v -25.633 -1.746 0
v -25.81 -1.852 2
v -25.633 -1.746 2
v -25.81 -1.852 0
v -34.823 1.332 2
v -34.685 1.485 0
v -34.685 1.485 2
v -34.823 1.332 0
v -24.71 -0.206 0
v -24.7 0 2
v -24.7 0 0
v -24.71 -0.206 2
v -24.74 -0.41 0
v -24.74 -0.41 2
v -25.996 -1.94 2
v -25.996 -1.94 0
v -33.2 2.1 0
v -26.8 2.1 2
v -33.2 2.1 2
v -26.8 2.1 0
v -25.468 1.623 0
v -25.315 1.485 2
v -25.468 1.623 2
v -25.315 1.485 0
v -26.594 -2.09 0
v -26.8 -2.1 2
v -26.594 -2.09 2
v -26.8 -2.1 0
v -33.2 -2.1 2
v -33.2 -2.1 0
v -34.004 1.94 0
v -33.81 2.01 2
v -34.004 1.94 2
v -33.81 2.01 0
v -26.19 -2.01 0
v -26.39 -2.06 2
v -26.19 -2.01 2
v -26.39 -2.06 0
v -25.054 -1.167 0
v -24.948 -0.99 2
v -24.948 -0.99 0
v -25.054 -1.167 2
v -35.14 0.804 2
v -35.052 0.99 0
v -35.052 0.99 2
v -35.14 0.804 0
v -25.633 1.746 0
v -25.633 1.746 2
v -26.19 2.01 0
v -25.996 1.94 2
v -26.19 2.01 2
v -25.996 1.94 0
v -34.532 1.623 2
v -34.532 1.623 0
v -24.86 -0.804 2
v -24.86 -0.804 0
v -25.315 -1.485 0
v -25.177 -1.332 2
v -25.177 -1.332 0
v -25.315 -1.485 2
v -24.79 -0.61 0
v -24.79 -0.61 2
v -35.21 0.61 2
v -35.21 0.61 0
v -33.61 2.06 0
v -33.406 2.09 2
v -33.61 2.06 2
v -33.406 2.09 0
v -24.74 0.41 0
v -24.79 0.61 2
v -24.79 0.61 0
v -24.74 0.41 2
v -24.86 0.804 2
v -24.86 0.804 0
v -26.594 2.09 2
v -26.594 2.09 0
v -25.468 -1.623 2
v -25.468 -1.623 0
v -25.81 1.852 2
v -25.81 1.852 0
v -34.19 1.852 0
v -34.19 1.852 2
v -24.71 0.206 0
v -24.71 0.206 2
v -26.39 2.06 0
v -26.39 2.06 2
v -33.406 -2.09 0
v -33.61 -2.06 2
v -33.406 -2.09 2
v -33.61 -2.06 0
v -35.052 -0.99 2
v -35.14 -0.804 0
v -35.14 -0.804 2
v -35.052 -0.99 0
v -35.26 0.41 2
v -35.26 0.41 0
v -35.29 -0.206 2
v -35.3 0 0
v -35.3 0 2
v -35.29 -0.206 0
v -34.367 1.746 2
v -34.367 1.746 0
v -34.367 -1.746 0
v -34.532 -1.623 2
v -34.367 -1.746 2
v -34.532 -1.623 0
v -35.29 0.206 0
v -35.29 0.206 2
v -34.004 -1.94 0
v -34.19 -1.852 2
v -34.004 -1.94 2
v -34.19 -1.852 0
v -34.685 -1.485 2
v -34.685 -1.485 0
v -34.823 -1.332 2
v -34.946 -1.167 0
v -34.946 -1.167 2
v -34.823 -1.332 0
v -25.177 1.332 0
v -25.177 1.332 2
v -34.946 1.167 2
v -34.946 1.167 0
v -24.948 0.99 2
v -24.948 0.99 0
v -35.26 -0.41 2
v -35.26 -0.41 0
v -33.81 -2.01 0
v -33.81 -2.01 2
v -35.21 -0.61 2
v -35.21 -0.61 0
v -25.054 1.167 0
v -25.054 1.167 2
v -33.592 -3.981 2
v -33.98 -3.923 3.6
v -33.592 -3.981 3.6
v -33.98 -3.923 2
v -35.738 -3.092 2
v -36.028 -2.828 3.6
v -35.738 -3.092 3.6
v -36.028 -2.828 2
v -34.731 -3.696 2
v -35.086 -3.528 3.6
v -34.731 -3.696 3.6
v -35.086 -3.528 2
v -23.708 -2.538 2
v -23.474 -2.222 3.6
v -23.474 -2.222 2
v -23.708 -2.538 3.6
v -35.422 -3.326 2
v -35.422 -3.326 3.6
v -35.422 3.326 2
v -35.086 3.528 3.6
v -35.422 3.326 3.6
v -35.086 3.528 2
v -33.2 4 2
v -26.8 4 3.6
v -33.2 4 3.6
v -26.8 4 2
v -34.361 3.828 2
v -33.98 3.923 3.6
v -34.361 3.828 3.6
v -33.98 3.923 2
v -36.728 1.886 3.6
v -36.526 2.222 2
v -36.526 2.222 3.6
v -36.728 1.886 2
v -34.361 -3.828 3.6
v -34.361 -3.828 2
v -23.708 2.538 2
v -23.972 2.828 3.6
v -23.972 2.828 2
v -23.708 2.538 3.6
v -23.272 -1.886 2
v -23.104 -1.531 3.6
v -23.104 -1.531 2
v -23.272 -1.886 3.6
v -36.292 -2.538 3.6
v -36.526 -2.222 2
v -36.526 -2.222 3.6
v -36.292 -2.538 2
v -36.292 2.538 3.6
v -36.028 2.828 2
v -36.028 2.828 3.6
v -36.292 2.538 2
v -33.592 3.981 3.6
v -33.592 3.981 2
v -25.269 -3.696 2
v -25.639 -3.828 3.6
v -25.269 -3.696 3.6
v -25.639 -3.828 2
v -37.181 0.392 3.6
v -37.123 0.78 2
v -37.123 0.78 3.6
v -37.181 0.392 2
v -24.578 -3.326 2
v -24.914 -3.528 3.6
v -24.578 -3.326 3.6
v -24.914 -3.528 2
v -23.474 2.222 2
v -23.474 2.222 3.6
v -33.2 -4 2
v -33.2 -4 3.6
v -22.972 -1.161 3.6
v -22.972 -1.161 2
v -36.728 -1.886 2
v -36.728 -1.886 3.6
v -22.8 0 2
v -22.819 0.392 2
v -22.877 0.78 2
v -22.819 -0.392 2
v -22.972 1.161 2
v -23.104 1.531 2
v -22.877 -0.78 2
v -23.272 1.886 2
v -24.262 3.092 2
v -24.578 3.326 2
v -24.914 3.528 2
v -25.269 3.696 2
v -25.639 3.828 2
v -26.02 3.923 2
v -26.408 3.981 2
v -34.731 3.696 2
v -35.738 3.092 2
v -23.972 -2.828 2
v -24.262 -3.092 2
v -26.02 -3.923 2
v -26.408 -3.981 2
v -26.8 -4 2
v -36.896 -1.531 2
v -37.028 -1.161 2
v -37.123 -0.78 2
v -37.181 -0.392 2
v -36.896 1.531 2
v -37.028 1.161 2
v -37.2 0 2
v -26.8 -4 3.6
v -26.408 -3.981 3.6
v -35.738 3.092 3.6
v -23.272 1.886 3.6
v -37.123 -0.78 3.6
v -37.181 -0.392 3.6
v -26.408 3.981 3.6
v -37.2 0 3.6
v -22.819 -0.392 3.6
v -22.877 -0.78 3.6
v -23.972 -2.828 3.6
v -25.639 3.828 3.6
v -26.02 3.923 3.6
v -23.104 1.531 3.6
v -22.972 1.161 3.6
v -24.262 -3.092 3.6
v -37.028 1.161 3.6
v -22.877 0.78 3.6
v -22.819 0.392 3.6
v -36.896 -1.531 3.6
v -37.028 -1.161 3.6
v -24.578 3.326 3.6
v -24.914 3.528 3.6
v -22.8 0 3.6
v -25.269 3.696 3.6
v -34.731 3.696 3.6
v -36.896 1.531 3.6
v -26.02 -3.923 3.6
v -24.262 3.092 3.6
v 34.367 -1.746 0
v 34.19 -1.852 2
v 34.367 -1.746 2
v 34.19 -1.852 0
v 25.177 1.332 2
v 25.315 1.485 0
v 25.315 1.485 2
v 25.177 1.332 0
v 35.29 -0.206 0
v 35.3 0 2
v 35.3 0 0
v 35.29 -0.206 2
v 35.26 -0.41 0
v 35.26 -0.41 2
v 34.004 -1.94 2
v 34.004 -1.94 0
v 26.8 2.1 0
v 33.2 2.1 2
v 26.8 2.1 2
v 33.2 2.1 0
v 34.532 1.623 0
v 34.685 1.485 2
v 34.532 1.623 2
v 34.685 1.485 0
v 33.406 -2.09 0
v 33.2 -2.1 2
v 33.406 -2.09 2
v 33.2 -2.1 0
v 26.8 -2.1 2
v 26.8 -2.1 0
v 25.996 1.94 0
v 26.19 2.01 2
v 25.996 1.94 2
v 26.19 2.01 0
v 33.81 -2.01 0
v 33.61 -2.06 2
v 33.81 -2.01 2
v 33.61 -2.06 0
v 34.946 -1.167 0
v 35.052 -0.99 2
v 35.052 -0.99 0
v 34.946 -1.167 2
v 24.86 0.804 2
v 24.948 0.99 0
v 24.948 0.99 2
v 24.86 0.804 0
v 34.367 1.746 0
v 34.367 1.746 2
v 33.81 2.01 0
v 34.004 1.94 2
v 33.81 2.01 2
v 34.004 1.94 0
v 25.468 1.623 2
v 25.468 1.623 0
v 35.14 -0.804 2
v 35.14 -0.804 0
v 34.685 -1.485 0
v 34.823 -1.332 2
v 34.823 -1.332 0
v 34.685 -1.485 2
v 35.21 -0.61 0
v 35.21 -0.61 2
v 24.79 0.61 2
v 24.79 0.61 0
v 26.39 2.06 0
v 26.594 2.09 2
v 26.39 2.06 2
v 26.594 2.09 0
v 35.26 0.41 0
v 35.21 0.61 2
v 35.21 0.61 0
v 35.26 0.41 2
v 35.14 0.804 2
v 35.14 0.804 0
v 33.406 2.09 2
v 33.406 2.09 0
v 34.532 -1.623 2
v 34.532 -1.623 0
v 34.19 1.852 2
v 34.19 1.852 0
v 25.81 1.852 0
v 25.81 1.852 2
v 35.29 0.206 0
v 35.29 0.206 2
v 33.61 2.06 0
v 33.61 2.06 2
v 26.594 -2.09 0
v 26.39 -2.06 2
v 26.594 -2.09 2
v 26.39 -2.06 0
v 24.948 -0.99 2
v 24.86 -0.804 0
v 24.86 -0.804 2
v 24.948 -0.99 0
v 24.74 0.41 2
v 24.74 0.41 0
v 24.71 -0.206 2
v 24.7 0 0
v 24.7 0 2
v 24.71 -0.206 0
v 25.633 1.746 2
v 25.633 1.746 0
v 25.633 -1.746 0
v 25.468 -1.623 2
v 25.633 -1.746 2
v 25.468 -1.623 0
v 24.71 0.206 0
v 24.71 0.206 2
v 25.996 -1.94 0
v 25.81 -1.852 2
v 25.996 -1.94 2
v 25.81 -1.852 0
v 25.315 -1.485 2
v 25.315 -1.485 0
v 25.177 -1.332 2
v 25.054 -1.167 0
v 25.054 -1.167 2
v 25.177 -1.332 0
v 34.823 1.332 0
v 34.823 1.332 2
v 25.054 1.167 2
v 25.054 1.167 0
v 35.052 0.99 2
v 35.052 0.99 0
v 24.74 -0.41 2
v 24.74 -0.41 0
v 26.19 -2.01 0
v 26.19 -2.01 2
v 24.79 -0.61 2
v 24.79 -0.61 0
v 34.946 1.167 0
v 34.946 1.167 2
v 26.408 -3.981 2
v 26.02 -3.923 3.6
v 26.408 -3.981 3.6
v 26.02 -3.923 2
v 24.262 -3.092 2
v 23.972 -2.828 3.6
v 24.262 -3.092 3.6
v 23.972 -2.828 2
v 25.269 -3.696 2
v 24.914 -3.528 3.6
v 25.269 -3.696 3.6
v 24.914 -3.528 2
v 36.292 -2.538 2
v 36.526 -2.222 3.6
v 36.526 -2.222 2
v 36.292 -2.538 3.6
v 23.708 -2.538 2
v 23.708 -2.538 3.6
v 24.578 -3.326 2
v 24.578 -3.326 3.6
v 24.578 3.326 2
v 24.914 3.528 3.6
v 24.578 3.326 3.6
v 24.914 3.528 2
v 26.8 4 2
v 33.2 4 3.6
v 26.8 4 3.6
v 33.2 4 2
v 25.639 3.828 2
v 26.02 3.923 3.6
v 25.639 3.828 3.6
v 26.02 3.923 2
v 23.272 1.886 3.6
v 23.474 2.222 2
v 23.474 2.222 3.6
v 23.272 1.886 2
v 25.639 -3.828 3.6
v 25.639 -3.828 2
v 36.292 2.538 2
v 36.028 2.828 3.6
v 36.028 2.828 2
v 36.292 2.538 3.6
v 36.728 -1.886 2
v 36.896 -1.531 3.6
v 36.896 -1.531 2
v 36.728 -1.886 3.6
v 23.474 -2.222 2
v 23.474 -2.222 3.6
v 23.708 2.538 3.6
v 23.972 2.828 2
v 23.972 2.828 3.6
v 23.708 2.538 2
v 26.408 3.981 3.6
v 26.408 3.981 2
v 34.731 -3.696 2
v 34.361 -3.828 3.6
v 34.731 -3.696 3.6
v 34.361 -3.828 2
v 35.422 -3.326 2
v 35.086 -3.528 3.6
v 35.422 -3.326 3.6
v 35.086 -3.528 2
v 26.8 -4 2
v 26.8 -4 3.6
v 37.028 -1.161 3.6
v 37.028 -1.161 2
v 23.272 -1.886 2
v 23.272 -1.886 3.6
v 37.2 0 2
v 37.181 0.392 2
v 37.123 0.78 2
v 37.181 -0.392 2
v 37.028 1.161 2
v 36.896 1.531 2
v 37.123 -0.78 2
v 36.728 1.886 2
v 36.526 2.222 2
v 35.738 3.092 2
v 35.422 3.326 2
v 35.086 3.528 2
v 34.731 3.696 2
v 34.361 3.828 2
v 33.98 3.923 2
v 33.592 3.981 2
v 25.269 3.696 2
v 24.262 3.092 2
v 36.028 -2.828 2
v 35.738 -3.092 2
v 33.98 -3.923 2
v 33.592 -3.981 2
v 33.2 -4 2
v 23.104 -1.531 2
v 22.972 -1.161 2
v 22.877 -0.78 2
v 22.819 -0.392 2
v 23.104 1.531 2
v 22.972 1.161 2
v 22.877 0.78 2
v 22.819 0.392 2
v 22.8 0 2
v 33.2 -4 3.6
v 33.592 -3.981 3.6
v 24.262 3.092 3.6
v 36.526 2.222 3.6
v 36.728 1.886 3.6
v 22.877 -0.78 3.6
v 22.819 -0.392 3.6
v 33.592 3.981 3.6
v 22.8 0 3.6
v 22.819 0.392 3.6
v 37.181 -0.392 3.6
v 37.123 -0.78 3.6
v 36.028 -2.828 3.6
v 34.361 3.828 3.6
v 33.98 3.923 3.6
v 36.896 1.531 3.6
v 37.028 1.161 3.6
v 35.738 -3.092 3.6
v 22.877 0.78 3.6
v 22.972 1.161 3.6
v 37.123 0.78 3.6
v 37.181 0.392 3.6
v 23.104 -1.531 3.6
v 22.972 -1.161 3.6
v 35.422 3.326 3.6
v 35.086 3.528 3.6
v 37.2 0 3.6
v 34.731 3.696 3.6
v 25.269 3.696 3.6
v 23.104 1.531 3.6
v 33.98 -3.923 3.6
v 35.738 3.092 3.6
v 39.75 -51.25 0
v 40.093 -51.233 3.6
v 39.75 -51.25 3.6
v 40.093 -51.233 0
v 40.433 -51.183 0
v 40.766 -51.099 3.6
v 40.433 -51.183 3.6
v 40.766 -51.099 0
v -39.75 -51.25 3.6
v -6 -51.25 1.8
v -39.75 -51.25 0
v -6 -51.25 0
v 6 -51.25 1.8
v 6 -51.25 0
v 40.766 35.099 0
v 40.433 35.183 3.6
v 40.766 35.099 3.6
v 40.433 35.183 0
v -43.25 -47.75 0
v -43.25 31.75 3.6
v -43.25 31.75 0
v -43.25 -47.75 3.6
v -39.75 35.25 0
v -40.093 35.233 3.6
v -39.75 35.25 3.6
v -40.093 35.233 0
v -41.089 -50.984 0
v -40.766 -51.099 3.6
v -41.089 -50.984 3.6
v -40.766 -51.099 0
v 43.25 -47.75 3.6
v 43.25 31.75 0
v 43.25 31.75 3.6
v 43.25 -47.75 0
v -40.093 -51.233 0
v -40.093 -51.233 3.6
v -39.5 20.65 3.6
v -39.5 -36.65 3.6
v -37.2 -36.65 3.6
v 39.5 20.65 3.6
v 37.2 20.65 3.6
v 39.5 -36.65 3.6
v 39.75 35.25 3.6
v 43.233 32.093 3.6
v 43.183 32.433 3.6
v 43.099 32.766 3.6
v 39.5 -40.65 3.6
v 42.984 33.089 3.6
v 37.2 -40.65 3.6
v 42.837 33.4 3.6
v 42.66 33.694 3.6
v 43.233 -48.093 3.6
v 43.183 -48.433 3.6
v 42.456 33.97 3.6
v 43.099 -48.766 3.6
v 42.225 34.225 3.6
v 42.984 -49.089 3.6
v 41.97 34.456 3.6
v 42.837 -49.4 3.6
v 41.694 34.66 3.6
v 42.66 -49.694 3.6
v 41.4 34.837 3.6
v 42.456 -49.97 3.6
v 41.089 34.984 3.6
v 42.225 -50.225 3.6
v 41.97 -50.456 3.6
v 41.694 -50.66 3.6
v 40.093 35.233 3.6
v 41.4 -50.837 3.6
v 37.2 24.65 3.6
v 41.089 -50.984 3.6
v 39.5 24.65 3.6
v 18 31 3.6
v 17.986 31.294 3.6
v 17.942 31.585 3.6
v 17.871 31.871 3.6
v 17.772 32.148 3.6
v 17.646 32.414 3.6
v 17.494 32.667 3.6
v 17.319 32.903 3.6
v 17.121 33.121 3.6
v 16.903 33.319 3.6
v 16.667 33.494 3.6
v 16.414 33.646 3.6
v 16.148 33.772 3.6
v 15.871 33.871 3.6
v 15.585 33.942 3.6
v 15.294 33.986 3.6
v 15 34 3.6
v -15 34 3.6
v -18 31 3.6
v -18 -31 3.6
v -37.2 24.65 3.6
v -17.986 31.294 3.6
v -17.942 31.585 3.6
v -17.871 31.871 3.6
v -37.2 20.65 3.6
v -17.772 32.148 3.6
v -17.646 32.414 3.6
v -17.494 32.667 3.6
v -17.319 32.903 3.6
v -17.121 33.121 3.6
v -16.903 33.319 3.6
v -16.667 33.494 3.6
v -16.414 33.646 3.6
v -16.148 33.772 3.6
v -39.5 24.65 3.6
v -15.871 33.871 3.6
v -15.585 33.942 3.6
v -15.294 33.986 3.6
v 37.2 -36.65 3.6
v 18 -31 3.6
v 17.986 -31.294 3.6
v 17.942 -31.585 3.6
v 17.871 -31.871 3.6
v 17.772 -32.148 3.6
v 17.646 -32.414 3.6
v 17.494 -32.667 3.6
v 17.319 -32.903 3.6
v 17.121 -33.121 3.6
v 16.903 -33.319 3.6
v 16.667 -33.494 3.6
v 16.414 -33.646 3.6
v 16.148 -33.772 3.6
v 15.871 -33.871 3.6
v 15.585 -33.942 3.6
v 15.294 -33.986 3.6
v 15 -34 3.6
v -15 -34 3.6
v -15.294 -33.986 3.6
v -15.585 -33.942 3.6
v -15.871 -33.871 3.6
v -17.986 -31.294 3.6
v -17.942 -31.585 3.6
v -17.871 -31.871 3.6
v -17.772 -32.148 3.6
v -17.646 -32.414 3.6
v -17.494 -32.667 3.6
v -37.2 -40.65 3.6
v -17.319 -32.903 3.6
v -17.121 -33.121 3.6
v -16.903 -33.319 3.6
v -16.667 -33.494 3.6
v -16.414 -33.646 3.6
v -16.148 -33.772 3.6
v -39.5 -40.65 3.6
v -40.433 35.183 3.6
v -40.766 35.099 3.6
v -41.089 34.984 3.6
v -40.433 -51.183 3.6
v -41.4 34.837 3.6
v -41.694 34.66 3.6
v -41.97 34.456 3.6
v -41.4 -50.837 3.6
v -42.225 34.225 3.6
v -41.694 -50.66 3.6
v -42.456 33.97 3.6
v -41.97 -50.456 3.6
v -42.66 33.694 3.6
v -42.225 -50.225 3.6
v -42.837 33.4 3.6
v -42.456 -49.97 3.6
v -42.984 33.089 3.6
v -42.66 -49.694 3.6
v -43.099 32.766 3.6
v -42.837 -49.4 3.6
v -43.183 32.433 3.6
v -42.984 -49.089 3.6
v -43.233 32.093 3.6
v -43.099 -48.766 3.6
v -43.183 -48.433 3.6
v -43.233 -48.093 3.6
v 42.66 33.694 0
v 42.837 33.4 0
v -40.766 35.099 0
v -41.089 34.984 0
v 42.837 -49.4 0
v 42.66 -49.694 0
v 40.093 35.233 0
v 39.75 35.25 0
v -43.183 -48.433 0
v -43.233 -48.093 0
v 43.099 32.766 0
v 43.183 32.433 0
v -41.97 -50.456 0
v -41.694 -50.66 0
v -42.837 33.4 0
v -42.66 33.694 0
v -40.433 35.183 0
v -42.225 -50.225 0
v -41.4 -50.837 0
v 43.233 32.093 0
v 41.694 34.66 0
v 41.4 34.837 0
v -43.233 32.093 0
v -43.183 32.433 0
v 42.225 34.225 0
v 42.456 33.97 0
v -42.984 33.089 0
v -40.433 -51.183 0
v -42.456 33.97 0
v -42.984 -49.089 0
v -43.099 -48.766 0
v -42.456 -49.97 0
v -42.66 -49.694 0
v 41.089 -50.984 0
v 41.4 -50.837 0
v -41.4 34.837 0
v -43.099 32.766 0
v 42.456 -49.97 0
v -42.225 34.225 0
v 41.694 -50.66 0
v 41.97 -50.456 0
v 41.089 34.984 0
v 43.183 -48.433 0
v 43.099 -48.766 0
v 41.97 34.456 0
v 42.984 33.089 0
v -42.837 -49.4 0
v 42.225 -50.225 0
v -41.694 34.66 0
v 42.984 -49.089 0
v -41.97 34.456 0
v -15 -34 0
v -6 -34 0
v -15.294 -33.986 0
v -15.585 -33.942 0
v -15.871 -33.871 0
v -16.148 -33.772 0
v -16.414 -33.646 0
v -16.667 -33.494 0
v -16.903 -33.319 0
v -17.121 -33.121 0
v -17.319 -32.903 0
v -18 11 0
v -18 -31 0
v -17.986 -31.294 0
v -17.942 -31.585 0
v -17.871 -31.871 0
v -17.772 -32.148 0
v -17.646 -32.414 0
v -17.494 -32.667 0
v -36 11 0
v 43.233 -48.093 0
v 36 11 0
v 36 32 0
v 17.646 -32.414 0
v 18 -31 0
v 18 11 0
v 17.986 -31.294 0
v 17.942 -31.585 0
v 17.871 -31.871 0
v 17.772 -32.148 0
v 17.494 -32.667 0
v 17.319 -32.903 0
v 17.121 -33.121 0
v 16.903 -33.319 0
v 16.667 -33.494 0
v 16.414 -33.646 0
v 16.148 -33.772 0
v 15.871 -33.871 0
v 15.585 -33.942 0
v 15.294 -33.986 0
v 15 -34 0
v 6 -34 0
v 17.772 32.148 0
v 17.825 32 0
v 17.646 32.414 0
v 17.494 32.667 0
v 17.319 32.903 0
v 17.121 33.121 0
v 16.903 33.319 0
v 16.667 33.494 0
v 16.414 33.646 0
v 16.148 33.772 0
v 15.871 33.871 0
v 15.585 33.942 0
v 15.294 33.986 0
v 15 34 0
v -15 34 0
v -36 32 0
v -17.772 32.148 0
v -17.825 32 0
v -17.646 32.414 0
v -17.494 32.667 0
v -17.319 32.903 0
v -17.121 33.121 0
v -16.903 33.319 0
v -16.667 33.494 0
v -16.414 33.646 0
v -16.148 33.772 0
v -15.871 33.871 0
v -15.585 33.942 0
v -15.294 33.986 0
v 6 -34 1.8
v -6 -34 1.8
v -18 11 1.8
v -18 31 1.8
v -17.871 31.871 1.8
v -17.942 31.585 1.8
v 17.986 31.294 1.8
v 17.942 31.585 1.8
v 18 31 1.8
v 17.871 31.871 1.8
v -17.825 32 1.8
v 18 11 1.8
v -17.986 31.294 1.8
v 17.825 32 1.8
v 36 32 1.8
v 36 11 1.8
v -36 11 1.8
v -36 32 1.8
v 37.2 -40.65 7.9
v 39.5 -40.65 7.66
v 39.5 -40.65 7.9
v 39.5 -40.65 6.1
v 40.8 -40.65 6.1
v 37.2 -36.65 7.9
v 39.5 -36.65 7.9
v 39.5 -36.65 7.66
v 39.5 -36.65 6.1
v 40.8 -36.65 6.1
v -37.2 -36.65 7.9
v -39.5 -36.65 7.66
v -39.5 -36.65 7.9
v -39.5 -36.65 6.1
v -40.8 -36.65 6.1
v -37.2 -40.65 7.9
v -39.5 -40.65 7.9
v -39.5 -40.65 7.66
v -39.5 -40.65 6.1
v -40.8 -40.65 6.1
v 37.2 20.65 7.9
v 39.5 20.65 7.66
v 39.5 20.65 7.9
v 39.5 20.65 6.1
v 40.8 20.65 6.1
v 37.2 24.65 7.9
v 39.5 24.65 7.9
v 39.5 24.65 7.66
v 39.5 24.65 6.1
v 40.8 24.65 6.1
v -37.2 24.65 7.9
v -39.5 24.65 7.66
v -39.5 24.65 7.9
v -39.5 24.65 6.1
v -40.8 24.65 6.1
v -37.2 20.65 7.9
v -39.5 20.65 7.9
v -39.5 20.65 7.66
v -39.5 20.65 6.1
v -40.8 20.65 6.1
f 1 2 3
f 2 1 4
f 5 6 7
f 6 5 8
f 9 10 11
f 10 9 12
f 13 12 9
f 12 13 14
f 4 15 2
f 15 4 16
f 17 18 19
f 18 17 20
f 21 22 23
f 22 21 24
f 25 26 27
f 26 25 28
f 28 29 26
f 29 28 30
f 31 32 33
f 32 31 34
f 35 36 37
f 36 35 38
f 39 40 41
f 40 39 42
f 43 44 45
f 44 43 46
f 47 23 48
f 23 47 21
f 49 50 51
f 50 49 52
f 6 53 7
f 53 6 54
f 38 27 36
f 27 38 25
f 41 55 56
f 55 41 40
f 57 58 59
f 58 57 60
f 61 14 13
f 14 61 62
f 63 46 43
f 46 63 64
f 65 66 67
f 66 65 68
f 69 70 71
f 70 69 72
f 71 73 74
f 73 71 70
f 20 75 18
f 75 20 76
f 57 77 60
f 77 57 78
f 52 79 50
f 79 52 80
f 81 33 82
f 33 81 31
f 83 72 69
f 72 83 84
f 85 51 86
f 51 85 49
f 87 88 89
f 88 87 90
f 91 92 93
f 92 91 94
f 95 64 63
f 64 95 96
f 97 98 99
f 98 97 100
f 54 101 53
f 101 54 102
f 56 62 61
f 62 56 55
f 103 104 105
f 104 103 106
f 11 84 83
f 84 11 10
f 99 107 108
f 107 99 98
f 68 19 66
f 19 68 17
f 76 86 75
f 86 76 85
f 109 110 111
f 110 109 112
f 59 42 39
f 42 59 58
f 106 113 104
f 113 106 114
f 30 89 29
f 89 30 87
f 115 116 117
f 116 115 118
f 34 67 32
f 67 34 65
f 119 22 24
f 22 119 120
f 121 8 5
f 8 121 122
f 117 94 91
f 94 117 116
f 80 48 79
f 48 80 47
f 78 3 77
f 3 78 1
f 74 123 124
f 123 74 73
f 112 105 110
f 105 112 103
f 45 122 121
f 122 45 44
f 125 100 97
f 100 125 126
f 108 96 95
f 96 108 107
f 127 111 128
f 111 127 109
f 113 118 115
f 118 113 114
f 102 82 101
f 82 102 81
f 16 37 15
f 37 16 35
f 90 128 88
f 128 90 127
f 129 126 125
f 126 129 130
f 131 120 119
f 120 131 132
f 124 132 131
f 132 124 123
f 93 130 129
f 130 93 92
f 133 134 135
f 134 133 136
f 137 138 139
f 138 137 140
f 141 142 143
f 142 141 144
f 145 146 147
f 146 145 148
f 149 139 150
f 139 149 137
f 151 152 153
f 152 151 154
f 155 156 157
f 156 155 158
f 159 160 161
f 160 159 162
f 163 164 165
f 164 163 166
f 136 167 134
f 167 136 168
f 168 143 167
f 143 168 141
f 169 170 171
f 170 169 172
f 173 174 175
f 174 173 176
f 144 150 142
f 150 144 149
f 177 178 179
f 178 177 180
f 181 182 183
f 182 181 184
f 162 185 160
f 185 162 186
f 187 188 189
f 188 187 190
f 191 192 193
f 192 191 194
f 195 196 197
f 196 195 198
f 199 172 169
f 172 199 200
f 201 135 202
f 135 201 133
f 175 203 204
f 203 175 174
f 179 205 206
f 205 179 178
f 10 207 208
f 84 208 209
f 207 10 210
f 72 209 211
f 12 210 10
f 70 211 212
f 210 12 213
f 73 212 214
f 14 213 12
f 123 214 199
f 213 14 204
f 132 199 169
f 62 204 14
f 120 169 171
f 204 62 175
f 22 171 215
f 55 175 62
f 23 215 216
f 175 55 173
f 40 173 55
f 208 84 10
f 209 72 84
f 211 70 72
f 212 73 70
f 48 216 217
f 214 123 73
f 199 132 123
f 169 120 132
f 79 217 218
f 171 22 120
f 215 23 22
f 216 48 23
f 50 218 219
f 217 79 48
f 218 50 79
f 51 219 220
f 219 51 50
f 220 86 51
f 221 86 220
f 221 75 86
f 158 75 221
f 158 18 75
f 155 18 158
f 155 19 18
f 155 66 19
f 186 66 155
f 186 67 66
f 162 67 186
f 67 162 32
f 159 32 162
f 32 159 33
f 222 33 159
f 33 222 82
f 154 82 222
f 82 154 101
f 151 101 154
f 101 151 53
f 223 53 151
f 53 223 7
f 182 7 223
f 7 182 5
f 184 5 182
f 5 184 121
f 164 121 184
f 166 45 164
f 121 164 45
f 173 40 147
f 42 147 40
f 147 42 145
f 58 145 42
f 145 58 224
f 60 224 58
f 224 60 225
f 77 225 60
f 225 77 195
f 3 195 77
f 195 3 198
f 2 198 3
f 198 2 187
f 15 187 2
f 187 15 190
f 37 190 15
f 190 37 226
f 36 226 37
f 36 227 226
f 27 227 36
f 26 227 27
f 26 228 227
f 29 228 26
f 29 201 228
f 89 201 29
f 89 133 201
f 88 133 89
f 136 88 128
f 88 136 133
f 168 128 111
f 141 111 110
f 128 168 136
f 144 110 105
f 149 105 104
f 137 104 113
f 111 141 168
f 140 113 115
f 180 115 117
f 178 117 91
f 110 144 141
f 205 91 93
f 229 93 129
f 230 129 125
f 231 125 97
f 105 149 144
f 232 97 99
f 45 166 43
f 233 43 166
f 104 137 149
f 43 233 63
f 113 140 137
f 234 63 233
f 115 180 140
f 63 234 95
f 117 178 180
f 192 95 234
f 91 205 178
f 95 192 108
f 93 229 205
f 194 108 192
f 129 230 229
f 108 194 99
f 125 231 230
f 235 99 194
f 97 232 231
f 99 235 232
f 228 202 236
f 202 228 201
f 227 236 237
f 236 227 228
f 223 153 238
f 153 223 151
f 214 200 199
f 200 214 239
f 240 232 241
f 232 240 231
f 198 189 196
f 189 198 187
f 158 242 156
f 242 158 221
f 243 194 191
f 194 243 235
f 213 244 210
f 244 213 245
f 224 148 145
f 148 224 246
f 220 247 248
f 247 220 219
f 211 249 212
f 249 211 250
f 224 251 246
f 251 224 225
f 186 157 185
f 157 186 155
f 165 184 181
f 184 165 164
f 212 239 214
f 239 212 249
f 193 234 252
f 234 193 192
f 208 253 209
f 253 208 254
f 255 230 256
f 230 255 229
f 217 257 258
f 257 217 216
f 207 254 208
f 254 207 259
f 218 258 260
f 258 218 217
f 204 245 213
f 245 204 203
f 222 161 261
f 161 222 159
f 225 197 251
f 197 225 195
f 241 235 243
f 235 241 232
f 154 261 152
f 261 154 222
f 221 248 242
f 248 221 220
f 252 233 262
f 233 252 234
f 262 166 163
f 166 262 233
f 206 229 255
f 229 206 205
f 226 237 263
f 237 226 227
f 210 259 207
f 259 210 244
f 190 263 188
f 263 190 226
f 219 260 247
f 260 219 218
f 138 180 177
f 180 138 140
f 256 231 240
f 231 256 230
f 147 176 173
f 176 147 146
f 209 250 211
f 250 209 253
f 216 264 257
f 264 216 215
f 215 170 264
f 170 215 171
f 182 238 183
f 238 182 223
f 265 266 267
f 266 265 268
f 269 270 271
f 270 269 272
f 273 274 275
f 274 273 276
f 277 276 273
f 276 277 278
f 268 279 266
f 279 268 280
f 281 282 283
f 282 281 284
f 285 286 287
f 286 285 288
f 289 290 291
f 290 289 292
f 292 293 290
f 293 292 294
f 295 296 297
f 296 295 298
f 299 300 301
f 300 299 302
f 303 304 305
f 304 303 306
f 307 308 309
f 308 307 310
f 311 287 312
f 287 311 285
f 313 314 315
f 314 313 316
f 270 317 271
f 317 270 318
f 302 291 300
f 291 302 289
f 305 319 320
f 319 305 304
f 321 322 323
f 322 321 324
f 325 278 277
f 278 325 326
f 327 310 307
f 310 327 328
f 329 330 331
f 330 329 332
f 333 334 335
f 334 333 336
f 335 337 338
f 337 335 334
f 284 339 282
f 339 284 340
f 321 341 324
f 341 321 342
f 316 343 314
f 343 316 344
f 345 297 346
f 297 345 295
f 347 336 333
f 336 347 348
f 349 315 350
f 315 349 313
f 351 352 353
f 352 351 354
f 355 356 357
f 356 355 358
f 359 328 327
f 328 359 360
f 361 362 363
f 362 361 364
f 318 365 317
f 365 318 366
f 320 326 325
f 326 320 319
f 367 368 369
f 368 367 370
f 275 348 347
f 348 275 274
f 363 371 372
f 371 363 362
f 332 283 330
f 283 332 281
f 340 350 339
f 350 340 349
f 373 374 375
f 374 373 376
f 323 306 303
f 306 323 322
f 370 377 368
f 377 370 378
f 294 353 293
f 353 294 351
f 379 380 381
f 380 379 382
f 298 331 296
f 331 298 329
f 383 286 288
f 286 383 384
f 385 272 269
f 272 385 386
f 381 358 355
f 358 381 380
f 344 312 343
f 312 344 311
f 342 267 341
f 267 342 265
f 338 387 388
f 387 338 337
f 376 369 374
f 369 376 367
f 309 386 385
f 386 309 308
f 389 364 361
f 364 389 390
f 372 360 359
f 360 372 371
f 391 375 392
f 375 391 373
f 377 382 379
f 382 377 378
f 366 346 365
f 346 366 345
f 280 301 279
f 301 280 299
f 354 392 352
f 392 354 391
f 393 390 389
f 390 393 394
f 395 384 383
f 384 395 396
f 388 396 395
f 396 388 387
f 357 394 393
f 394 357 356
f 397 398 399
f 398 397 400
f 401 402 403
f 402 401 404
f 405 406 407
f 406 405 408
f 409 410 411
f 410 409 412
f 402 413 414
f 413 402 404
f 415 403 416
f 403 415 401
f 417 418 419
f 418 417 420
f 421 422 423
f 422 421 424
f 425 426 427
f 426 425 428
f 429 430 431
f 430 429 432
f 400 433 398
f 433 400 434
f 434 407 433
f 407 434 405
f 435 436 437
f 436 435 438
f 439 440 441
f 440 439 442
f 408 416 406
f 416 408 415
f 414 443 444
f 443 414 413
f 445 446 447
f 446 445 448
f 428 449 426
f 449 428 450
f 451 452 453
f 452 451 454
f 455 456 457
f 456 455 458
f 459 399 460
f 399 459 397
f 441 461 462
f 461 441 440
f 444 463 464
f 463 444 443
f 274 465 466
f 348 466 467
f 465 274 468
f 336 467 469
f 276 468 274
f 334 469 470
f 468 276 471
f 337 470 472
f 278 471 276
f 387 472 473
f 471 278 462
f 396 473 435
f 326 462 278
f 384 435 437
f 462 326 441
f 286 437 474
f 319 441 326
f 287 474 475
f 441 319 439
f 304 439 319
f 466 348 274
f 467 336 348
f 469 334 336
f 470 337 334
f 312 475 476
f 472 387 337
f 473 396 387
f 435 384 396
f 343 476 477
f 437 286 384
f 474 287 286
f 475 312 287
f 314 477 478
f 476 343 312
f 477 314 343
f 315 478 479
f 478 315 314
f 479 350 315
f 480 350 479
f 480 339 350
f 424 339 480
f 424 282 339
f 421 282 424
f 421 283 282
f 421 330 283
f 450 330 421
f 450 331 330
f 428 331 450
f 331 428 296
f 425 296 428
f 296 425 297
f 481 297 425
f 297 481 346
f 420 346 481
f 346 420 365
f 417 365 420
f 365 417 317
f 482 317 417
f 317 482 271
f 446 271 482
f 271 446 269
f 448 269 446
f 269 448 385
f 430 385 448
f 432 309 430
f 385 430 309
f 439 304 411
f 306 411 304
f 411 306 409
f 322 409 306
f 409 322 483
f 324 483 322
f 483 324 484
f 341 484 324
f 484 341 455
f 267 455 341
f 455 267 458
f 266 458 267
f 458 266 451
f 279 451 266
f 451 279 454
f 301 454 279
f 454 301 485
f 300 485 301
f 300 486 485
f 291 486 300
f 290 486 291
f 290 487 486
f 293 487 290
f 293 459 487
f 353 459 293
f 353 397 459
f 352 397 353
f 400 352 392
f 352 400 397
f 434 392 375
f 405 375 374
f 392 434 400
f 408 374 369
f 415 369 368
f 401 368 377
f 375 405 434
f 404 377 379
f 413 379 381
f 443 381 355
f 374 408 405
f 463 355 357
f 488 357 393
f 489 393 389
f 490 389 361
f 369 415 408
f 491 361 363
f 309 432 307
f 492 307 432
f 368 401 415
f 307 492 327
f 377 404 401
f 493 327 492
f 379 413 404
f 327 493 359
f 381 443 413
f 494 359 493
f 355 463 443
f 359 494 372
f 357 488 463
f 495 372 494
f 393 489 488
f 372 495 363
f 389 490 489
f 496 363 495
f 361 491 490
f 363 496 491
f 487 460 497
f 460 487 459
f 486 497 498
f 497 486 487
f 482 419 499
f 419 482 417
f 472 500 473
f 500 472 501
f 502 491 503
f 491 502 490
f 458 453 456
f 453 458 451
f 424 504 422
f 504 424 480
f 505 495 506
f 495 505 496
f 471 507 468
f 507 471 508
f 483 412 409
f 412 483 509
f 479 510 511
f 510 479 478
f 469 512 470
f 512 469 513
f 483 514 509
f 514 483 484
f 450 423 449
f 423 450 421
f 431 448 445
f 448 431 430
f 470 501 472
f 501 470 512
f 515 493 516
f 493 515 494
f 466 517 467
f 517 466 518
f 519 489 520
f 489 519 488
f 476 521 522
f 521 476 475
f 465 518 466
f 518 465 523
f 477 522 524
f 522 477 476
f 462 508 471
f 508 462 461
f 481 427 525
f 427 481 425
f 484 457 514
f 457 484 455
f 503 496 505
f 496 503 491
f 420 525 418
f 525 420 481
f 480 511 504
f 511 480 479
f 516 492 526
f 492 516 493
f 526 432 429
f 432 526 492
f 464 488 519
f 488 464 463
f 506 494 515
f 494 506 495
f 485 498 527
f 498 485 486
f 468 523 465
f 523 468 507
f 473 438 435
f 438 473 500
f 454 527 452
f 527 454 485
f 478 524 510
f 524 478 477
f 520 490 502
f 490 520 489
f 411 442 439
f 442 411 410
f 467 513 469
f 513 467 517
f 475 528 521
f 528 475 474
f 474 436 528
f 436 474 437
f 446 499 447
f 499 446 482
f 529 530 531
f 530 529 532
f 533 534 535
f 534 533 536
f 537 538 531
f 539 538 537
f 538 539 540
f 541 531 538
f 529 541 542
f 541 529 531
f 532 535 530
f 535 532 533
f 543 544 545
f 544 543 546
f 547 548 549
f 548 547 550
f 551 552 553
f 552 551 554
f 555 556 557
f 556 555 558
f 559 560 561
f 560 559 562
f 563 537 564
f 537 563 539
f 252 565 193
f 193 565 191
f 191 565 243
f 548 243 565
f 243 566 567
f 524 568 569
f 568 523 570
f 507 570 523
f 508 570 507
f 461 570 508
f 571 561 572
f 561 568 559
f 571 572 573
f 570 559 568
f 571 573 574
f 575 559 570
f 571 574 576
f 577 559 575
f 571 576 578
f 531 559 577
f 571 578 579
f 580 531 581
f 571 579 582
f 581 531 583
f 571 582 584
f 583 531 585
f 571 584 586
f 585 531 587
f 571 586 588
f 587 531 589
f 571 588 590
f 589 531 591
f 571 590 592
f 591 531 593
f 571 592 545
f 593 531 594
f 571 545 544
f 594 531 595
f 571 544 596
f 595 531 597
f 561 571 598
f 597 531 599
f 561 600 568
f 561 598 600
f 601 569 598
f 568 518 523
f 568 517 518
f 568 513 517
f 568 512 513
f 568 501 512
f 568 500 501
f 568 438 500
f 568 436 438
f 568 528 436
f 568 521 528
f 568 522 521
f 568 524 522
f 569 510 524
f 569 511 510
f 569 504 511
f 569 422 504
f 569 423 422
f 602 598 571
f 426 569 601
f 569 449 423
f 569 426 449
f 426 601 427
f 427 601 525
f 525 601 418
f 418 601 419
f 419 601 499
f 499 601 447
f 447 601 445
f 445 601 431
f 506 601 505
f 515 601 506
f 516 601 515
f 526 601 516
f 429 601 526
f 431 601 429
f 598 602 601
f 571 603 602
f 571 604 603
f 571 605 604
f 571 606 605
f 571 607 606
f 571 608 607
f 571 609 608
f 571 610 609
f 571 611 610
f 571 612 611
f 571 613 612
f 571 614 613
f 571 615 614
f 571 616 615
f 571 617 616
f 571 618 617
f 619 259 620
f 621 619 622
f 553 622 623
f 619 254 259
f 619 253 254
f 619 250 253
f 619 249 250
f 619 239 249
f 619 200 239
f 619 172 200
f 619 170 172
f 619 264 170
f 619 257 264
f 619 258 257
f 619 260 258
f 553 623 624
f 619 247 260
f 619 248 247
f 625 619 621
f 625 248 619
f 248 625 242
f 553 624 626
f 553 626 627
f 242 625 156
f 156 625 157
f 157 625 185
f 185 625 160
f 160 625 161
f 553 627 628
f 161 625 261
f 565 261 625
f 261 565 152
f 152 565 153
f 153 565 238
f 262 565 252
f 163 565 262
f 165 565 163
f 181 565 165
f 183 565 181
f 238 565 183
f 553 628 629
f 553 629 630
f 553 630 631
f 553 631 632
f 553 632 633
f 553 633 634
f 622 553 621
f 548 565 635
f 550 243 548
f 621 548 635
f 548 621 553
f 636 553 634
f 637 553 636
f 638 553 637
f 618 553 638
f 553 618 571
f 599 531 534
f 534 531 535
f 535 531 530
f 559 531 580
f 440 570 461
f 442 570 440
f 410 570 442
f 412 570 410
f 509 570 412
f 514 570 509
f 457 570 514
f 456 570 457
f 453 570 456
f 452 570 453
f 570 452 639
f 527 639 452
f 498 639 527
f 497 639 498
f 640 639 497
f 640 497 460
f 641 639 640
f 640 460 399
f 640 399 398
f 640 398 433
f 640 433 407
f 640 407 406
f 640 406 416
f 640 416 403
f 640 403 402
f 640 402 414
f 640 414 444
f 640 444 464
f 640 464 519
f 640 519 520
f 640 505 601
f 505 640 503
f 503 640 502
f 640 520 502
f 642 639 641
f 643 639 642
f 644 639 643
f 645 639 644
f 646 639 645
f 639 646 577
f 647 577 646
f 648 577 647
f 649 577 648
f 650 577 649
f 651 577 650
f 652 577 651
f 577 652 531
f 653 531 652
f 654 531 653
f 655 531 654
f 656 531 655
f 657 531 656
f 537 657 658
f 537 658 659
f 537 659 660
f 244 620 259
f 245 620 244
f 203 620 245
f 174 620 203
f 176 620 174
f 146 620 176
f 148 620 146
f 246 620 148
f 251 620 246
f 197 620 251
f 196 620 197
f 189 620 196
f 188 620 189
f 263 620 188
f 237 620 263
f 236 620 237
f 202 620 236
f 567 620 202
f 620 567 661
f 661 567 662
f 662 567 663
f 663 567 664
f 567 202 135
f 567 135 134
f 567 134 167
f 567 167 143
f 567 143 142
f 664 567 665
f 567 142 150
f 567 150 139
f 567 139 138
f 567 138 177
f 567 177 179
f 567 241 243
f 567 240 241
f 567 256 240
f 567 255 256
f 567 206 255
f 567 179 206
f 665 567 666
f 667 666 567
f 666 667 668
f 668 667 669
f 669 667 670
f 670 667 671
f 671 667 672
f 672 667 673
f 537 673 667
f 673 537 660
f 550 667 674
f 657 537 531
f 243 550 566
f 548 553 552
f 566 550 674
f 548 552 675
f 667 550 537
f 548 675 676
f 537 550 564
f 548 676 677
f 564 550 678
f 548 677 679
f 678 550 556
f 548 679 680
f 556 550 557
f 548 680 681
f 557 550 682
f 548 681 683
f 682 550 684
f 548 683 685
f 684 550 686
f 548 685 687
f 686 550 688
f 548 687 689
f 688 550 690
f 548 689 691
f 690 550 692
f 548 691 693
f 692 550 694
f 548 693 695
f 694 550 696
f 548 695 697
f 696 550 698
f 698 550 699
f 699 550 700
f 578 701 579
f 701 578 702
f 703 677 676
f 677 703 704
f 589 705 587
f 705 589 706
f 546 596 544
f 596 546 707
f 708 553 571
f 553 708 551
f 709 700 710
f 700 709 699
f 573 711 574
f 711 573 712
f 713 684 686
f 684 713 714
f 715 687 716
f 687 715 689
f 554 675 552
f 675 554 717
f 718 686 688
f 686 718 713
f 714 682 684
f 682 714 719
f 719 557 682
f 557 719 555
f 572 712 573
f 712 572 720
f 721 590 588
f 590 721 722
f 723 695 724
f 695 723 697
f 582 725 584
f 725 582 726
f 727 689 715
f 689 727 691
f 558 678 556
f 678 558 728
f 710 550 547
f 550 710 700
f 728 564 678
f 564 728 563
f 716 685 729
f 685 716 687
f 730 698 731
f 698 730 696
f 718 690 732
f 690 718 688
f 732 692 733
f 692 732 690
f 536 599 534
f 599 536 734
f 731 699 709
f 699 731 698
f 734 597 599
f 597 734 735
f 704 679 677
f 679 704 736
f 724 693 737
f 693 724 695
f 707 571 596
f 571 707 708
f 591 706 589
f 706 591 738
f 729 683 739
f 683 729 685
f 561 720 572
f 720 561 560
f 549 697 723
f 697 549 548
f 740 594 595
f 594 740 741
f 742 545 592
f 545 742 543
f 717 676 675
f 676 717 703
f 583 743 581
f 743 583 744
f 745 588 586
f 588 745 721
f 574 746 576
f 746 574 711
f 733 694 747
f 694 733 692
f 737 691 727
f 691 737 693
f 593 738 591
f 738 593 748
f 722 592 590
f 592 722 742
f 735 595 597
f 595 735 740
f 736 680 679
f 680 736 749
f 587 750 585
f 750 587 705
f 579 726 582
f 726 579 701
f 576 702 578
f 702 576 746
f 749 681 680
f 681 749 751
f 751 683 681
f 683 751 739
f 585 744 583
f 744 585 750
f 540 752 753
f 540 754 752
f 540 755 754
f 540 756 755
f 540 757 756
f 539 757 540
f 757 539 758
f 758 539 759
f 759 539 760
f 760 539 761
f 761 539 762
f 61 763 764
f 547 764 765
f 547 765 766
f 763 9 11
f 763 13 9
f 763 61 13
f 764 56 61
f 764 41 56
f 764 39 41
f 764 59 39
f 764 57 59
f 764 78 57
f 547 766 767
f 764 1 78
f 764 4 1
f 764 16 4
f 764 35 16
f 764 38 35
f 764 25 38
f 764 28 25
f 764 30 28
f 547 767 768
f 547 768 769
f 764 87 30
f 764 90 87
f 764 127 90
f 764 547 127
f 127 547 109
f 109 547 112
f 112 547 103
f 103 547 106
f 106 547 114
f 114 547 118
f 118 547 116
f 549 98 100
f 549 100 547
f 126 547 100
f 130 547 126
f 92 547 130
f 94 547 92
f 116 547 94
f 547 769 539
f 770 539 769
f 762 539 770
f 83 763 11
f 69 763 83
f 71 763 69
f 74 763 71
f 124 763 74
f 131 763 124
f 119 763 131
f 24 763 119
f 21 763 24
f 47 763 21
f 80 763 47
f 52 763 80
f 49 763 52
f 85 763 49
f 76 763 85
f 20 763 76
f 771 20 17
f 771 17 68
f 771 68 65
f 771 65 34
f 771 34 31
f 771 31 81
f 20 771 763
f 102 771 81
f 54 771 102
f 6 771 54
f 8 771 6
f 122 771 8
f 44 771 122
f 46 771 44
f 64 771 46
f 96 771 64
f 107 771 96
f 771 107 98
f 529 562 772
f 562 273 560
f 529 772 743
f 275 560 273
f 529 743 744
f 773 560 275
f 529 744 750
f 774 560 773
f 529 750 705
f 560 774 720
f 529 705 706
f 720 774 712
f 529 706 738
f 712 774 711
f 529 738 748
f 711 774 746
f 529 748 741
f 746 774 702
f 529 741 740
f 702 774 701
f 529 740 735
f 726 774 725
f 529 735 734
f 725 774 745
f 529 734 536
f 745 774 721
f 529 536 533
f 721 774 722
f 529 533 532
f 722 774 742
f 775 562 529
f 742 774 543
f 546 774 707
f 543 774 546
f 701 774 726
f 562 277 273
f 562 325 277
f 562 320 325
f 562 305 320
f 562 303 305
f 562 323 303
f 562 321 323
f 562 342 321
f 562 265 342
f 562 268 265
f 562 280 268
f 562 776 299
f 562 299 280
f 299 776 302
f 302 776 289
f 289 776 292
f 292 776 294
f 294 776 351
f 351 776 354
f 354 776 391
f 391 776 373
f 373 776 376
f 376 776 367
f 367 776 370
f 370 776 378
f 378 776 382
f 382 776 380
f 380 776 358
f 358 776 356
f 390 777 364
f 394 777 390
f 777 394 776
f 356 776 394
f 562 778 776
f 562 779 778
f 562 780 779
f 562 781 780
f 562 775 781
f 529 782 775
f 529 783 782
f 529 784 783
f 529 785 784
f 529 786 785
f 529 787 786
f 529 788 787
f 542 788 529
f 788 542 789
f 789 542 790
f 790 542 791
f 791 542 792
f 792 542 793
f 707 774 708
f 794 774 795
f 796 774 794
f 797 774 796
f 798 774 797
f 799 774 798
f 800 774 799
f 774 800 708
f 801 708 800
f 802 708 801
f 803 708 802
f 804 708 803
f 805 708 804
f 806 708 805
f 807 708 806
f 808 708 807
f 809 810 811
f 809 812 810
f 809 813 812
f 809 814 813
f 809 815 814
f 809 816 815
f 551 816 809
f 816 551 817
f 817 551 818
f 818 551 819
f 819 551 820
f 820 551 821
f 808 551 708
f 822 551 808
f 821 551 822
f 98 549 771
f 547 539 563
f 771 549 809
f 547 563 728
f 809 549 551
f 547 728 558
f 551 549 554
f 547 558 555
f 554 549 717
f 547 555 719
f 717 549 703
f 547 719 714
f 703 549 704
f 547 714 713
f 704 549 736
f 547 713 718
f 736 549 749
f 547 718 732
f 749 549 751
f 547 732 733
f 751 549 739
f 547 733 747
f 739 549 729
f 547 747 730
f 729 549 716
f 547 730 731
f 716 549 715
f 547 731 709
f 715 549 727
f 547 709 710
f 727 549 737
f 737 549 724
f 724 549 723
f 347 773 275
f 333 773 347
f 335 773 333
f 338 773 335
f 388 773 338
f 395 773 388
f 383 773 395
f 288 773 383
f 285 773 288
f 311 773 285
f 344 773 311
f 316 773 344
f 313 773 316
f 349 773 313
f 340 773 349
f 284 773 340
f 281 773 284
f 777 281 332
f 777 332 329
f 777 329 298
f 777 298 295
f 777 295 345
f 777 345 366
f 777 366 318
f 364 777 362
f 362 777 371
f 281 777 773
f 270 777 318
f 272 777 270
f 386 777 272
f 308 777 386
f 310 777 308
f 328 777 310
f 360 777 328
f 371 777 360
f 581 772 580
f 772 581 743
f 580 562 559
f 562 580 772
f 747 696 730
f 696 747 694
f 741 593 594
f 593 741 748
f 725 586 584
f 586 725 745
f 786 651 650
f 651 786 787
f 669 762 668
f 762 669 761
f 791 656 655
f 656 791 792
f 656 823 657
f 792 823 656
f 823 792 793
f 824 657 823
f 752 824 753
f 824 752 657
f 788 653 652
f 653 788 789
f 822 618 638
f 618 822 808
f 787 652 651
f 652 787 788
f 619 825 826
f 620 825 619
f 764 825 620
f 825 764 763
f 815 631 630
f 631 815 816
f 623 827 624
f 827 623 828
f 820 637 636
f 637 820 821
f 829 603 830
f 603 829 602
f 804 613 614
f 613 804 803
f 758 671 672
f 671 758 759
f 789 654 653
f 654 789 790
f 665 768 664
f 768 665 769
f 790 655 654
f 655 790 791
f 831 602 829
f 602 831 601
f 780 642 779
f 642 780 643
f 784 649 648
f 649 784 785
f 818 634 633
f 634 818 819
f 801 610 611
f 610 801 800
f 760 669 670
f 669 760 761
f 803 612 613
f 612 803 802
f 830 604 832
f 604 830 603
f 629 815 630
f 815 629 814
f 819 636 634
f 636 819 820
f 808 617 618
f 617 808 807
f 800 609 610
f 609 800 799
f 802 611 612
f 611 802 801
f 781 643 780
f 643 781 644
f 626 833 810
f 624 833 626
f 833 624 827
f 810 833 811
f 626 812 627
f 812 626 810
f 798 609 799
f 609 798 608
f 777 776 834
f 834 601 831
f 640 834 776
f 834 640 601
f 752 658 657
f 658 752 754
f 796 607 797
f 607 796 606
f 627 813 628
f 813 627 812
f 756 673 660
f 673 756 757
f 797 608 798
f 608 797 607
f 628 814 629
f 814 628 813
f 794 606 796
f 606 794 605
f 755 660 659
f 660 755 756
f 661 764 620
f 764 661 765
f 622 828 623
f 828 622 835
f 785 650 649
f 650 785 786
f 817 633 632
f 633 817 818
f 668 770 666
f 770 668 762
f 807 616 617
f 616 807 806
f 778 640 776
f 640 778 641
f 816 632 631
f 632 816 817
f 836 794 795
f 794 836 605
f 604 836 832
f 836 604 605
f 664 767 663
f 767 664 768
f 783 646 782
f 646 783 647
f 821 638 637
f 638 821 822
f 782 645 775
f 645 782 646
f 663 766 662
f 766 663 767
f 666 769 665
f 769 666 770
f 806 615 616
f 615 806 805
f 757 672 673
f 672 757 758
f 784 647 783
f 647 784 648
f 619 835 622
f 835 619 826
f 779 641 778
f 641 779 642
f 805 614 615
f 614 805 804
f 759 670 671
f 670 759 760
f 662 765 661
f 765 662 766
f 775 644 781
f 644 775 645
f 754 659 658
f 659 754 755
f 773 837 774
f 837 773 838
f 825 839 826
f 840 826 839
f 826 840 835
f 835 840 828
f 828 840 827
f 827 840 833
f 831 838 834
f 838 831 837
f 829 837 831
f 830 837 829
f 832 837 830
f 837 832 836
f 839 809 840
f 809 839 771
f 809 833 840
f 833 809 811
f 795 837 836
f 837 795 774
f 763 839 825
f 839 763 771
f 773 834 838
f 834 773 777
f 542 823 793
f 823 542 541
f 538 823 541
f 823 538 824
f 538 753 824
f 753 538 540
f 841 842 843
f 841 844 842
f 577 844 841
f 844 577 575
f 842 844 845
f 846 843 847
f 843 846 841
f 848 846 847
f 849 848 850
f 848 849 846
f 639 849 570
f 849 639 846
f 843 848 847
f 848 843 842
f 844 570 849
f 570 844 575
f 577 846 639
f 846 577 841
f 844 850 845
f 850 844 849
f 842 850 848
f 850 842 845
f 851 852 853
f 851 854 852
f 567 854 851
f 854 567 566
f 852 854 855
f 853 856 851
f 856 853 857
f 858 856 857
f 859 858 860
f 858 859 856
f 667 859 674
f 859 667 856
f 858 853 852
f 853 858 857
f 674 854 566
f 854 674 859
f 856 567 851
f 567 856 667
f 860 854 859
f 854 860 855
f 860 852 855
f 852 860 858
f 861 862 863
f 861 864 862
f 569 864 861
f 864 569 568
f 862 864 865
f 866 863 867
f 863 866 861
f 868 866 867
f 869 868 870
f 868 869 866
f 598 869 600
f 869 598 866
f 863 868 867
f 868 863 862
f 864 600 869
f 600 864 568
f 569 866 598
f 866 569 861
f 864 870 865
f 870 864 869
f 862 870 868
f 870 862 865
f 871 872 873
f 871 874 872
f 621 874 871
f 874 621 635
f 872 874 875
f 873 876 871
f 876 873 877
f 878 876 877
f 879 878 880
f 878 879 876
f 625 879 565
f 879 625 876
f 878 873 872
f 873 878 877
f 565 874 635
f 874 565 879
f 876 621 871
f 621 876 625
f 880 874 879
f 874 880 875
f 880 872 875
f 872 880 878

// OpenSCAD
// Dummy wall plate for the Guition ESP32-4848S040 display-only module.
// Screws to a European round box (60 mm screw spacing). The display then
// sits on four pins. Each pin is 2.5 mm tall under an outward hook that
// locks into a hole in the frame, 2 mm high and 1.5 mm deep.
// USB-C and the SD slot face down.
//
// Measured slots: 4.2 mm wide, 2.5 mm thick at most.
// 61.3 mm is the pitch of the two pins on one side (same edge to same edge).
// 79 mm is back face to back face of the two opposite rows.
// The rows sit on the left and right. Set pin_rotation to 90 if the slots
// are on the top and bottom instead.
//
// Print the gauge first and try it in the frame. PETG, 0.2 mm layers,
// 0.4 mm nozzle, 4 perimeters. No supports. Back of the plate on the bed,
// pins pointing up.
//
// OpenSCAD: open this file, turn on the customizer, render, export STL.

/* [Part] */
part = "plate"; // [plate, gauge]

/* [Display] */
display_w = 86.5;
display_h = 86.5;
// Guition drawing marks this "T". The plate sits behind the housing.
display_thickness = 13.6;
// Moves the display down relative to the screws, so the 8-pin header
// near the top of the board hangs into the box.
display_drop = 8;

/* [Pins] */
// Slot size. The printed pin is this minus pin_clear so it can enter.
pin_w = 4.2;
pin_t = 2.5;
pin_clear = 0.2;
// Pin height from the plate up to the underside of the hook.
stem_h = 2.5;
// Hole the hook locks into.
hole_h = 2;
hole_d = 1.5;
// Same edge of one pin to the same edge of the pin beside it.
pin_pitch = 61.3;
// Outside of one row to the outside of the opposite row.
pin_back = 79;
// 0: pins on the left and right. 90: pins on the top and bottom.
pin_rotation = 0; // [0, 90]

/* [Wall box] */
screw_span = 60;
screw_d = 4.2;
slot_extra = 3.2;
screw_head_d = 8;
screw_head_h = 1.6;

/* [Openings] */
opening_w = 36;
opening_h = 68;
upper_w = 72;
upper_y0 = 11;
upper_y1 = 32;
cable_w = 12;

/* [Plate] */
plate_t = 3.6;
// Gauge only. Thin so a fit check prints quickly.
gauge_t = 1.2;
corner_r = 3.5;

/* [Header] */
// From the center of the display, looking at the back, USB edge down.
// The red block in the preview is this socket. Keep it in the hole.
header_x = -14;
header_y = 28;
header_w = 20;
header_h = 8;
header_t = 9;

/* [Hidden] */
$fn = 64;

module rounded_slab(w, h, t, r) {
    linear_extrude(t, convexity = 4)
        offset(r = r)
            offset(delta = -r)
                square([w, h], center = true);
}

// Local axes: +Z toward the device, +Y outward, width along X.
// The inner face is one straight wall. The hook is only on the outside:
// a level ledge, then a top that slopes back to the pin.
//
//        /|              |\
//        ||              ||
//   =========================   <- plate, wall is below
module attachment_pin() {
    w = pin_w - pin_clear;
    t = pin_t - pin_clear;
    hh = hole_h - pin_clear;
    hd = hole_d - pin_clear;
    z0 = stem_h;

    translate([-w / 2, -t, -0.2])
        cube([w, t, stem_h + hh + 0.2]);

    // polygon x = outward, polygon y = height. Extrude along the width.
    translate([-w / 2, 0, 0])
        rotate([0, 0, 90])
            rotate([90, 0, 0])
                linear_extrude(w, convexity = 4)
                    polygon([
                        [-0.2, z0],
                        [hd, z0],
                        [-0.2, z0 + hh]
                    ]);
}

module attachment_pins(base_t) {
    for (sy = [-1, 1]) {
        translate([pin_back / 2, sy * pin_pitch / 2, base_t])
            rotate([0, 0, -90])
                attachment_pin();
        translate([-pin_back / 2, sy * pin_pitch / 2, base_t])
            rotate([0, 0, 90])
                attachment_pin();
    }
}

module screw_cut(span, diameter, depth, z0) {
    hull() {
        translate([-span, 0, z0])
            cylinder(d = diameter, h = depth);
        translate([span, 0, z0])
            cylinder(d = diameter, h = depth);
    }
}

module backplate() {
    plate_bottom = -display_drop - display_h / 2;

    difference() {
        translate([0, -display_drop, 0])
            rounded_slab(display_w, display_h, plate_t, corner_r);

        translate([0, 0, -1])
            rounded_slab(opening_w, opening_h, plate_t + 2, 3);

        translate([0, (upper_y0 + upper_y1) / 2, -1])
            cube([upper_w, upper_y1 - upper_y0, plate_t + 2], center = true);

        translate([0, (plate_bottom - opening_h / 2) / 2, -1])
            cube([
                cable_w,
                -plate_bottom - opening_h / 2 + 0.8,
                plate_t + 2
            ], center = true);

        for (sx = [-1, 1]) {
            translate([sx * screw_span / 2, 0, -1])
                screw_cut(slot_extra, screw_d, plate_t + 2, 0);
            translate([sx * screw_span / 2, 0, plate_t - screw_head_h])
                screw_cut(slot_extra, screw_head_d, screw_head_h + 0.2, 0);
        }
    }

    translate([0, -display_drop, 0])
        rotate([0, 0, pin_rotation])
            attachment_pins(plate_t);

    %translate([0, -display_drop, plate_t + display_thickness / 2])
        cube([display_w, display_h, display_thickness], center = true);
    %translate([header_x, header_y - display_drop, plate_t + header_t / 2])
        color("crimson")
            cube([header_w, header_h, header_t], center = true);
}

// Same four pins, on a thin pad, for a quick measurement check.
module gauge() {
    gauge_h = pin_pitch + pin_w + 10;
    rounded_slab(pin_back, gauge_h, gauge_t, 2);
    rotate([0, 0, pin_rotation])
        attachment_pins(gauge_t);
}

if (part == "gauge")
    gauge();
else
    backplate();
